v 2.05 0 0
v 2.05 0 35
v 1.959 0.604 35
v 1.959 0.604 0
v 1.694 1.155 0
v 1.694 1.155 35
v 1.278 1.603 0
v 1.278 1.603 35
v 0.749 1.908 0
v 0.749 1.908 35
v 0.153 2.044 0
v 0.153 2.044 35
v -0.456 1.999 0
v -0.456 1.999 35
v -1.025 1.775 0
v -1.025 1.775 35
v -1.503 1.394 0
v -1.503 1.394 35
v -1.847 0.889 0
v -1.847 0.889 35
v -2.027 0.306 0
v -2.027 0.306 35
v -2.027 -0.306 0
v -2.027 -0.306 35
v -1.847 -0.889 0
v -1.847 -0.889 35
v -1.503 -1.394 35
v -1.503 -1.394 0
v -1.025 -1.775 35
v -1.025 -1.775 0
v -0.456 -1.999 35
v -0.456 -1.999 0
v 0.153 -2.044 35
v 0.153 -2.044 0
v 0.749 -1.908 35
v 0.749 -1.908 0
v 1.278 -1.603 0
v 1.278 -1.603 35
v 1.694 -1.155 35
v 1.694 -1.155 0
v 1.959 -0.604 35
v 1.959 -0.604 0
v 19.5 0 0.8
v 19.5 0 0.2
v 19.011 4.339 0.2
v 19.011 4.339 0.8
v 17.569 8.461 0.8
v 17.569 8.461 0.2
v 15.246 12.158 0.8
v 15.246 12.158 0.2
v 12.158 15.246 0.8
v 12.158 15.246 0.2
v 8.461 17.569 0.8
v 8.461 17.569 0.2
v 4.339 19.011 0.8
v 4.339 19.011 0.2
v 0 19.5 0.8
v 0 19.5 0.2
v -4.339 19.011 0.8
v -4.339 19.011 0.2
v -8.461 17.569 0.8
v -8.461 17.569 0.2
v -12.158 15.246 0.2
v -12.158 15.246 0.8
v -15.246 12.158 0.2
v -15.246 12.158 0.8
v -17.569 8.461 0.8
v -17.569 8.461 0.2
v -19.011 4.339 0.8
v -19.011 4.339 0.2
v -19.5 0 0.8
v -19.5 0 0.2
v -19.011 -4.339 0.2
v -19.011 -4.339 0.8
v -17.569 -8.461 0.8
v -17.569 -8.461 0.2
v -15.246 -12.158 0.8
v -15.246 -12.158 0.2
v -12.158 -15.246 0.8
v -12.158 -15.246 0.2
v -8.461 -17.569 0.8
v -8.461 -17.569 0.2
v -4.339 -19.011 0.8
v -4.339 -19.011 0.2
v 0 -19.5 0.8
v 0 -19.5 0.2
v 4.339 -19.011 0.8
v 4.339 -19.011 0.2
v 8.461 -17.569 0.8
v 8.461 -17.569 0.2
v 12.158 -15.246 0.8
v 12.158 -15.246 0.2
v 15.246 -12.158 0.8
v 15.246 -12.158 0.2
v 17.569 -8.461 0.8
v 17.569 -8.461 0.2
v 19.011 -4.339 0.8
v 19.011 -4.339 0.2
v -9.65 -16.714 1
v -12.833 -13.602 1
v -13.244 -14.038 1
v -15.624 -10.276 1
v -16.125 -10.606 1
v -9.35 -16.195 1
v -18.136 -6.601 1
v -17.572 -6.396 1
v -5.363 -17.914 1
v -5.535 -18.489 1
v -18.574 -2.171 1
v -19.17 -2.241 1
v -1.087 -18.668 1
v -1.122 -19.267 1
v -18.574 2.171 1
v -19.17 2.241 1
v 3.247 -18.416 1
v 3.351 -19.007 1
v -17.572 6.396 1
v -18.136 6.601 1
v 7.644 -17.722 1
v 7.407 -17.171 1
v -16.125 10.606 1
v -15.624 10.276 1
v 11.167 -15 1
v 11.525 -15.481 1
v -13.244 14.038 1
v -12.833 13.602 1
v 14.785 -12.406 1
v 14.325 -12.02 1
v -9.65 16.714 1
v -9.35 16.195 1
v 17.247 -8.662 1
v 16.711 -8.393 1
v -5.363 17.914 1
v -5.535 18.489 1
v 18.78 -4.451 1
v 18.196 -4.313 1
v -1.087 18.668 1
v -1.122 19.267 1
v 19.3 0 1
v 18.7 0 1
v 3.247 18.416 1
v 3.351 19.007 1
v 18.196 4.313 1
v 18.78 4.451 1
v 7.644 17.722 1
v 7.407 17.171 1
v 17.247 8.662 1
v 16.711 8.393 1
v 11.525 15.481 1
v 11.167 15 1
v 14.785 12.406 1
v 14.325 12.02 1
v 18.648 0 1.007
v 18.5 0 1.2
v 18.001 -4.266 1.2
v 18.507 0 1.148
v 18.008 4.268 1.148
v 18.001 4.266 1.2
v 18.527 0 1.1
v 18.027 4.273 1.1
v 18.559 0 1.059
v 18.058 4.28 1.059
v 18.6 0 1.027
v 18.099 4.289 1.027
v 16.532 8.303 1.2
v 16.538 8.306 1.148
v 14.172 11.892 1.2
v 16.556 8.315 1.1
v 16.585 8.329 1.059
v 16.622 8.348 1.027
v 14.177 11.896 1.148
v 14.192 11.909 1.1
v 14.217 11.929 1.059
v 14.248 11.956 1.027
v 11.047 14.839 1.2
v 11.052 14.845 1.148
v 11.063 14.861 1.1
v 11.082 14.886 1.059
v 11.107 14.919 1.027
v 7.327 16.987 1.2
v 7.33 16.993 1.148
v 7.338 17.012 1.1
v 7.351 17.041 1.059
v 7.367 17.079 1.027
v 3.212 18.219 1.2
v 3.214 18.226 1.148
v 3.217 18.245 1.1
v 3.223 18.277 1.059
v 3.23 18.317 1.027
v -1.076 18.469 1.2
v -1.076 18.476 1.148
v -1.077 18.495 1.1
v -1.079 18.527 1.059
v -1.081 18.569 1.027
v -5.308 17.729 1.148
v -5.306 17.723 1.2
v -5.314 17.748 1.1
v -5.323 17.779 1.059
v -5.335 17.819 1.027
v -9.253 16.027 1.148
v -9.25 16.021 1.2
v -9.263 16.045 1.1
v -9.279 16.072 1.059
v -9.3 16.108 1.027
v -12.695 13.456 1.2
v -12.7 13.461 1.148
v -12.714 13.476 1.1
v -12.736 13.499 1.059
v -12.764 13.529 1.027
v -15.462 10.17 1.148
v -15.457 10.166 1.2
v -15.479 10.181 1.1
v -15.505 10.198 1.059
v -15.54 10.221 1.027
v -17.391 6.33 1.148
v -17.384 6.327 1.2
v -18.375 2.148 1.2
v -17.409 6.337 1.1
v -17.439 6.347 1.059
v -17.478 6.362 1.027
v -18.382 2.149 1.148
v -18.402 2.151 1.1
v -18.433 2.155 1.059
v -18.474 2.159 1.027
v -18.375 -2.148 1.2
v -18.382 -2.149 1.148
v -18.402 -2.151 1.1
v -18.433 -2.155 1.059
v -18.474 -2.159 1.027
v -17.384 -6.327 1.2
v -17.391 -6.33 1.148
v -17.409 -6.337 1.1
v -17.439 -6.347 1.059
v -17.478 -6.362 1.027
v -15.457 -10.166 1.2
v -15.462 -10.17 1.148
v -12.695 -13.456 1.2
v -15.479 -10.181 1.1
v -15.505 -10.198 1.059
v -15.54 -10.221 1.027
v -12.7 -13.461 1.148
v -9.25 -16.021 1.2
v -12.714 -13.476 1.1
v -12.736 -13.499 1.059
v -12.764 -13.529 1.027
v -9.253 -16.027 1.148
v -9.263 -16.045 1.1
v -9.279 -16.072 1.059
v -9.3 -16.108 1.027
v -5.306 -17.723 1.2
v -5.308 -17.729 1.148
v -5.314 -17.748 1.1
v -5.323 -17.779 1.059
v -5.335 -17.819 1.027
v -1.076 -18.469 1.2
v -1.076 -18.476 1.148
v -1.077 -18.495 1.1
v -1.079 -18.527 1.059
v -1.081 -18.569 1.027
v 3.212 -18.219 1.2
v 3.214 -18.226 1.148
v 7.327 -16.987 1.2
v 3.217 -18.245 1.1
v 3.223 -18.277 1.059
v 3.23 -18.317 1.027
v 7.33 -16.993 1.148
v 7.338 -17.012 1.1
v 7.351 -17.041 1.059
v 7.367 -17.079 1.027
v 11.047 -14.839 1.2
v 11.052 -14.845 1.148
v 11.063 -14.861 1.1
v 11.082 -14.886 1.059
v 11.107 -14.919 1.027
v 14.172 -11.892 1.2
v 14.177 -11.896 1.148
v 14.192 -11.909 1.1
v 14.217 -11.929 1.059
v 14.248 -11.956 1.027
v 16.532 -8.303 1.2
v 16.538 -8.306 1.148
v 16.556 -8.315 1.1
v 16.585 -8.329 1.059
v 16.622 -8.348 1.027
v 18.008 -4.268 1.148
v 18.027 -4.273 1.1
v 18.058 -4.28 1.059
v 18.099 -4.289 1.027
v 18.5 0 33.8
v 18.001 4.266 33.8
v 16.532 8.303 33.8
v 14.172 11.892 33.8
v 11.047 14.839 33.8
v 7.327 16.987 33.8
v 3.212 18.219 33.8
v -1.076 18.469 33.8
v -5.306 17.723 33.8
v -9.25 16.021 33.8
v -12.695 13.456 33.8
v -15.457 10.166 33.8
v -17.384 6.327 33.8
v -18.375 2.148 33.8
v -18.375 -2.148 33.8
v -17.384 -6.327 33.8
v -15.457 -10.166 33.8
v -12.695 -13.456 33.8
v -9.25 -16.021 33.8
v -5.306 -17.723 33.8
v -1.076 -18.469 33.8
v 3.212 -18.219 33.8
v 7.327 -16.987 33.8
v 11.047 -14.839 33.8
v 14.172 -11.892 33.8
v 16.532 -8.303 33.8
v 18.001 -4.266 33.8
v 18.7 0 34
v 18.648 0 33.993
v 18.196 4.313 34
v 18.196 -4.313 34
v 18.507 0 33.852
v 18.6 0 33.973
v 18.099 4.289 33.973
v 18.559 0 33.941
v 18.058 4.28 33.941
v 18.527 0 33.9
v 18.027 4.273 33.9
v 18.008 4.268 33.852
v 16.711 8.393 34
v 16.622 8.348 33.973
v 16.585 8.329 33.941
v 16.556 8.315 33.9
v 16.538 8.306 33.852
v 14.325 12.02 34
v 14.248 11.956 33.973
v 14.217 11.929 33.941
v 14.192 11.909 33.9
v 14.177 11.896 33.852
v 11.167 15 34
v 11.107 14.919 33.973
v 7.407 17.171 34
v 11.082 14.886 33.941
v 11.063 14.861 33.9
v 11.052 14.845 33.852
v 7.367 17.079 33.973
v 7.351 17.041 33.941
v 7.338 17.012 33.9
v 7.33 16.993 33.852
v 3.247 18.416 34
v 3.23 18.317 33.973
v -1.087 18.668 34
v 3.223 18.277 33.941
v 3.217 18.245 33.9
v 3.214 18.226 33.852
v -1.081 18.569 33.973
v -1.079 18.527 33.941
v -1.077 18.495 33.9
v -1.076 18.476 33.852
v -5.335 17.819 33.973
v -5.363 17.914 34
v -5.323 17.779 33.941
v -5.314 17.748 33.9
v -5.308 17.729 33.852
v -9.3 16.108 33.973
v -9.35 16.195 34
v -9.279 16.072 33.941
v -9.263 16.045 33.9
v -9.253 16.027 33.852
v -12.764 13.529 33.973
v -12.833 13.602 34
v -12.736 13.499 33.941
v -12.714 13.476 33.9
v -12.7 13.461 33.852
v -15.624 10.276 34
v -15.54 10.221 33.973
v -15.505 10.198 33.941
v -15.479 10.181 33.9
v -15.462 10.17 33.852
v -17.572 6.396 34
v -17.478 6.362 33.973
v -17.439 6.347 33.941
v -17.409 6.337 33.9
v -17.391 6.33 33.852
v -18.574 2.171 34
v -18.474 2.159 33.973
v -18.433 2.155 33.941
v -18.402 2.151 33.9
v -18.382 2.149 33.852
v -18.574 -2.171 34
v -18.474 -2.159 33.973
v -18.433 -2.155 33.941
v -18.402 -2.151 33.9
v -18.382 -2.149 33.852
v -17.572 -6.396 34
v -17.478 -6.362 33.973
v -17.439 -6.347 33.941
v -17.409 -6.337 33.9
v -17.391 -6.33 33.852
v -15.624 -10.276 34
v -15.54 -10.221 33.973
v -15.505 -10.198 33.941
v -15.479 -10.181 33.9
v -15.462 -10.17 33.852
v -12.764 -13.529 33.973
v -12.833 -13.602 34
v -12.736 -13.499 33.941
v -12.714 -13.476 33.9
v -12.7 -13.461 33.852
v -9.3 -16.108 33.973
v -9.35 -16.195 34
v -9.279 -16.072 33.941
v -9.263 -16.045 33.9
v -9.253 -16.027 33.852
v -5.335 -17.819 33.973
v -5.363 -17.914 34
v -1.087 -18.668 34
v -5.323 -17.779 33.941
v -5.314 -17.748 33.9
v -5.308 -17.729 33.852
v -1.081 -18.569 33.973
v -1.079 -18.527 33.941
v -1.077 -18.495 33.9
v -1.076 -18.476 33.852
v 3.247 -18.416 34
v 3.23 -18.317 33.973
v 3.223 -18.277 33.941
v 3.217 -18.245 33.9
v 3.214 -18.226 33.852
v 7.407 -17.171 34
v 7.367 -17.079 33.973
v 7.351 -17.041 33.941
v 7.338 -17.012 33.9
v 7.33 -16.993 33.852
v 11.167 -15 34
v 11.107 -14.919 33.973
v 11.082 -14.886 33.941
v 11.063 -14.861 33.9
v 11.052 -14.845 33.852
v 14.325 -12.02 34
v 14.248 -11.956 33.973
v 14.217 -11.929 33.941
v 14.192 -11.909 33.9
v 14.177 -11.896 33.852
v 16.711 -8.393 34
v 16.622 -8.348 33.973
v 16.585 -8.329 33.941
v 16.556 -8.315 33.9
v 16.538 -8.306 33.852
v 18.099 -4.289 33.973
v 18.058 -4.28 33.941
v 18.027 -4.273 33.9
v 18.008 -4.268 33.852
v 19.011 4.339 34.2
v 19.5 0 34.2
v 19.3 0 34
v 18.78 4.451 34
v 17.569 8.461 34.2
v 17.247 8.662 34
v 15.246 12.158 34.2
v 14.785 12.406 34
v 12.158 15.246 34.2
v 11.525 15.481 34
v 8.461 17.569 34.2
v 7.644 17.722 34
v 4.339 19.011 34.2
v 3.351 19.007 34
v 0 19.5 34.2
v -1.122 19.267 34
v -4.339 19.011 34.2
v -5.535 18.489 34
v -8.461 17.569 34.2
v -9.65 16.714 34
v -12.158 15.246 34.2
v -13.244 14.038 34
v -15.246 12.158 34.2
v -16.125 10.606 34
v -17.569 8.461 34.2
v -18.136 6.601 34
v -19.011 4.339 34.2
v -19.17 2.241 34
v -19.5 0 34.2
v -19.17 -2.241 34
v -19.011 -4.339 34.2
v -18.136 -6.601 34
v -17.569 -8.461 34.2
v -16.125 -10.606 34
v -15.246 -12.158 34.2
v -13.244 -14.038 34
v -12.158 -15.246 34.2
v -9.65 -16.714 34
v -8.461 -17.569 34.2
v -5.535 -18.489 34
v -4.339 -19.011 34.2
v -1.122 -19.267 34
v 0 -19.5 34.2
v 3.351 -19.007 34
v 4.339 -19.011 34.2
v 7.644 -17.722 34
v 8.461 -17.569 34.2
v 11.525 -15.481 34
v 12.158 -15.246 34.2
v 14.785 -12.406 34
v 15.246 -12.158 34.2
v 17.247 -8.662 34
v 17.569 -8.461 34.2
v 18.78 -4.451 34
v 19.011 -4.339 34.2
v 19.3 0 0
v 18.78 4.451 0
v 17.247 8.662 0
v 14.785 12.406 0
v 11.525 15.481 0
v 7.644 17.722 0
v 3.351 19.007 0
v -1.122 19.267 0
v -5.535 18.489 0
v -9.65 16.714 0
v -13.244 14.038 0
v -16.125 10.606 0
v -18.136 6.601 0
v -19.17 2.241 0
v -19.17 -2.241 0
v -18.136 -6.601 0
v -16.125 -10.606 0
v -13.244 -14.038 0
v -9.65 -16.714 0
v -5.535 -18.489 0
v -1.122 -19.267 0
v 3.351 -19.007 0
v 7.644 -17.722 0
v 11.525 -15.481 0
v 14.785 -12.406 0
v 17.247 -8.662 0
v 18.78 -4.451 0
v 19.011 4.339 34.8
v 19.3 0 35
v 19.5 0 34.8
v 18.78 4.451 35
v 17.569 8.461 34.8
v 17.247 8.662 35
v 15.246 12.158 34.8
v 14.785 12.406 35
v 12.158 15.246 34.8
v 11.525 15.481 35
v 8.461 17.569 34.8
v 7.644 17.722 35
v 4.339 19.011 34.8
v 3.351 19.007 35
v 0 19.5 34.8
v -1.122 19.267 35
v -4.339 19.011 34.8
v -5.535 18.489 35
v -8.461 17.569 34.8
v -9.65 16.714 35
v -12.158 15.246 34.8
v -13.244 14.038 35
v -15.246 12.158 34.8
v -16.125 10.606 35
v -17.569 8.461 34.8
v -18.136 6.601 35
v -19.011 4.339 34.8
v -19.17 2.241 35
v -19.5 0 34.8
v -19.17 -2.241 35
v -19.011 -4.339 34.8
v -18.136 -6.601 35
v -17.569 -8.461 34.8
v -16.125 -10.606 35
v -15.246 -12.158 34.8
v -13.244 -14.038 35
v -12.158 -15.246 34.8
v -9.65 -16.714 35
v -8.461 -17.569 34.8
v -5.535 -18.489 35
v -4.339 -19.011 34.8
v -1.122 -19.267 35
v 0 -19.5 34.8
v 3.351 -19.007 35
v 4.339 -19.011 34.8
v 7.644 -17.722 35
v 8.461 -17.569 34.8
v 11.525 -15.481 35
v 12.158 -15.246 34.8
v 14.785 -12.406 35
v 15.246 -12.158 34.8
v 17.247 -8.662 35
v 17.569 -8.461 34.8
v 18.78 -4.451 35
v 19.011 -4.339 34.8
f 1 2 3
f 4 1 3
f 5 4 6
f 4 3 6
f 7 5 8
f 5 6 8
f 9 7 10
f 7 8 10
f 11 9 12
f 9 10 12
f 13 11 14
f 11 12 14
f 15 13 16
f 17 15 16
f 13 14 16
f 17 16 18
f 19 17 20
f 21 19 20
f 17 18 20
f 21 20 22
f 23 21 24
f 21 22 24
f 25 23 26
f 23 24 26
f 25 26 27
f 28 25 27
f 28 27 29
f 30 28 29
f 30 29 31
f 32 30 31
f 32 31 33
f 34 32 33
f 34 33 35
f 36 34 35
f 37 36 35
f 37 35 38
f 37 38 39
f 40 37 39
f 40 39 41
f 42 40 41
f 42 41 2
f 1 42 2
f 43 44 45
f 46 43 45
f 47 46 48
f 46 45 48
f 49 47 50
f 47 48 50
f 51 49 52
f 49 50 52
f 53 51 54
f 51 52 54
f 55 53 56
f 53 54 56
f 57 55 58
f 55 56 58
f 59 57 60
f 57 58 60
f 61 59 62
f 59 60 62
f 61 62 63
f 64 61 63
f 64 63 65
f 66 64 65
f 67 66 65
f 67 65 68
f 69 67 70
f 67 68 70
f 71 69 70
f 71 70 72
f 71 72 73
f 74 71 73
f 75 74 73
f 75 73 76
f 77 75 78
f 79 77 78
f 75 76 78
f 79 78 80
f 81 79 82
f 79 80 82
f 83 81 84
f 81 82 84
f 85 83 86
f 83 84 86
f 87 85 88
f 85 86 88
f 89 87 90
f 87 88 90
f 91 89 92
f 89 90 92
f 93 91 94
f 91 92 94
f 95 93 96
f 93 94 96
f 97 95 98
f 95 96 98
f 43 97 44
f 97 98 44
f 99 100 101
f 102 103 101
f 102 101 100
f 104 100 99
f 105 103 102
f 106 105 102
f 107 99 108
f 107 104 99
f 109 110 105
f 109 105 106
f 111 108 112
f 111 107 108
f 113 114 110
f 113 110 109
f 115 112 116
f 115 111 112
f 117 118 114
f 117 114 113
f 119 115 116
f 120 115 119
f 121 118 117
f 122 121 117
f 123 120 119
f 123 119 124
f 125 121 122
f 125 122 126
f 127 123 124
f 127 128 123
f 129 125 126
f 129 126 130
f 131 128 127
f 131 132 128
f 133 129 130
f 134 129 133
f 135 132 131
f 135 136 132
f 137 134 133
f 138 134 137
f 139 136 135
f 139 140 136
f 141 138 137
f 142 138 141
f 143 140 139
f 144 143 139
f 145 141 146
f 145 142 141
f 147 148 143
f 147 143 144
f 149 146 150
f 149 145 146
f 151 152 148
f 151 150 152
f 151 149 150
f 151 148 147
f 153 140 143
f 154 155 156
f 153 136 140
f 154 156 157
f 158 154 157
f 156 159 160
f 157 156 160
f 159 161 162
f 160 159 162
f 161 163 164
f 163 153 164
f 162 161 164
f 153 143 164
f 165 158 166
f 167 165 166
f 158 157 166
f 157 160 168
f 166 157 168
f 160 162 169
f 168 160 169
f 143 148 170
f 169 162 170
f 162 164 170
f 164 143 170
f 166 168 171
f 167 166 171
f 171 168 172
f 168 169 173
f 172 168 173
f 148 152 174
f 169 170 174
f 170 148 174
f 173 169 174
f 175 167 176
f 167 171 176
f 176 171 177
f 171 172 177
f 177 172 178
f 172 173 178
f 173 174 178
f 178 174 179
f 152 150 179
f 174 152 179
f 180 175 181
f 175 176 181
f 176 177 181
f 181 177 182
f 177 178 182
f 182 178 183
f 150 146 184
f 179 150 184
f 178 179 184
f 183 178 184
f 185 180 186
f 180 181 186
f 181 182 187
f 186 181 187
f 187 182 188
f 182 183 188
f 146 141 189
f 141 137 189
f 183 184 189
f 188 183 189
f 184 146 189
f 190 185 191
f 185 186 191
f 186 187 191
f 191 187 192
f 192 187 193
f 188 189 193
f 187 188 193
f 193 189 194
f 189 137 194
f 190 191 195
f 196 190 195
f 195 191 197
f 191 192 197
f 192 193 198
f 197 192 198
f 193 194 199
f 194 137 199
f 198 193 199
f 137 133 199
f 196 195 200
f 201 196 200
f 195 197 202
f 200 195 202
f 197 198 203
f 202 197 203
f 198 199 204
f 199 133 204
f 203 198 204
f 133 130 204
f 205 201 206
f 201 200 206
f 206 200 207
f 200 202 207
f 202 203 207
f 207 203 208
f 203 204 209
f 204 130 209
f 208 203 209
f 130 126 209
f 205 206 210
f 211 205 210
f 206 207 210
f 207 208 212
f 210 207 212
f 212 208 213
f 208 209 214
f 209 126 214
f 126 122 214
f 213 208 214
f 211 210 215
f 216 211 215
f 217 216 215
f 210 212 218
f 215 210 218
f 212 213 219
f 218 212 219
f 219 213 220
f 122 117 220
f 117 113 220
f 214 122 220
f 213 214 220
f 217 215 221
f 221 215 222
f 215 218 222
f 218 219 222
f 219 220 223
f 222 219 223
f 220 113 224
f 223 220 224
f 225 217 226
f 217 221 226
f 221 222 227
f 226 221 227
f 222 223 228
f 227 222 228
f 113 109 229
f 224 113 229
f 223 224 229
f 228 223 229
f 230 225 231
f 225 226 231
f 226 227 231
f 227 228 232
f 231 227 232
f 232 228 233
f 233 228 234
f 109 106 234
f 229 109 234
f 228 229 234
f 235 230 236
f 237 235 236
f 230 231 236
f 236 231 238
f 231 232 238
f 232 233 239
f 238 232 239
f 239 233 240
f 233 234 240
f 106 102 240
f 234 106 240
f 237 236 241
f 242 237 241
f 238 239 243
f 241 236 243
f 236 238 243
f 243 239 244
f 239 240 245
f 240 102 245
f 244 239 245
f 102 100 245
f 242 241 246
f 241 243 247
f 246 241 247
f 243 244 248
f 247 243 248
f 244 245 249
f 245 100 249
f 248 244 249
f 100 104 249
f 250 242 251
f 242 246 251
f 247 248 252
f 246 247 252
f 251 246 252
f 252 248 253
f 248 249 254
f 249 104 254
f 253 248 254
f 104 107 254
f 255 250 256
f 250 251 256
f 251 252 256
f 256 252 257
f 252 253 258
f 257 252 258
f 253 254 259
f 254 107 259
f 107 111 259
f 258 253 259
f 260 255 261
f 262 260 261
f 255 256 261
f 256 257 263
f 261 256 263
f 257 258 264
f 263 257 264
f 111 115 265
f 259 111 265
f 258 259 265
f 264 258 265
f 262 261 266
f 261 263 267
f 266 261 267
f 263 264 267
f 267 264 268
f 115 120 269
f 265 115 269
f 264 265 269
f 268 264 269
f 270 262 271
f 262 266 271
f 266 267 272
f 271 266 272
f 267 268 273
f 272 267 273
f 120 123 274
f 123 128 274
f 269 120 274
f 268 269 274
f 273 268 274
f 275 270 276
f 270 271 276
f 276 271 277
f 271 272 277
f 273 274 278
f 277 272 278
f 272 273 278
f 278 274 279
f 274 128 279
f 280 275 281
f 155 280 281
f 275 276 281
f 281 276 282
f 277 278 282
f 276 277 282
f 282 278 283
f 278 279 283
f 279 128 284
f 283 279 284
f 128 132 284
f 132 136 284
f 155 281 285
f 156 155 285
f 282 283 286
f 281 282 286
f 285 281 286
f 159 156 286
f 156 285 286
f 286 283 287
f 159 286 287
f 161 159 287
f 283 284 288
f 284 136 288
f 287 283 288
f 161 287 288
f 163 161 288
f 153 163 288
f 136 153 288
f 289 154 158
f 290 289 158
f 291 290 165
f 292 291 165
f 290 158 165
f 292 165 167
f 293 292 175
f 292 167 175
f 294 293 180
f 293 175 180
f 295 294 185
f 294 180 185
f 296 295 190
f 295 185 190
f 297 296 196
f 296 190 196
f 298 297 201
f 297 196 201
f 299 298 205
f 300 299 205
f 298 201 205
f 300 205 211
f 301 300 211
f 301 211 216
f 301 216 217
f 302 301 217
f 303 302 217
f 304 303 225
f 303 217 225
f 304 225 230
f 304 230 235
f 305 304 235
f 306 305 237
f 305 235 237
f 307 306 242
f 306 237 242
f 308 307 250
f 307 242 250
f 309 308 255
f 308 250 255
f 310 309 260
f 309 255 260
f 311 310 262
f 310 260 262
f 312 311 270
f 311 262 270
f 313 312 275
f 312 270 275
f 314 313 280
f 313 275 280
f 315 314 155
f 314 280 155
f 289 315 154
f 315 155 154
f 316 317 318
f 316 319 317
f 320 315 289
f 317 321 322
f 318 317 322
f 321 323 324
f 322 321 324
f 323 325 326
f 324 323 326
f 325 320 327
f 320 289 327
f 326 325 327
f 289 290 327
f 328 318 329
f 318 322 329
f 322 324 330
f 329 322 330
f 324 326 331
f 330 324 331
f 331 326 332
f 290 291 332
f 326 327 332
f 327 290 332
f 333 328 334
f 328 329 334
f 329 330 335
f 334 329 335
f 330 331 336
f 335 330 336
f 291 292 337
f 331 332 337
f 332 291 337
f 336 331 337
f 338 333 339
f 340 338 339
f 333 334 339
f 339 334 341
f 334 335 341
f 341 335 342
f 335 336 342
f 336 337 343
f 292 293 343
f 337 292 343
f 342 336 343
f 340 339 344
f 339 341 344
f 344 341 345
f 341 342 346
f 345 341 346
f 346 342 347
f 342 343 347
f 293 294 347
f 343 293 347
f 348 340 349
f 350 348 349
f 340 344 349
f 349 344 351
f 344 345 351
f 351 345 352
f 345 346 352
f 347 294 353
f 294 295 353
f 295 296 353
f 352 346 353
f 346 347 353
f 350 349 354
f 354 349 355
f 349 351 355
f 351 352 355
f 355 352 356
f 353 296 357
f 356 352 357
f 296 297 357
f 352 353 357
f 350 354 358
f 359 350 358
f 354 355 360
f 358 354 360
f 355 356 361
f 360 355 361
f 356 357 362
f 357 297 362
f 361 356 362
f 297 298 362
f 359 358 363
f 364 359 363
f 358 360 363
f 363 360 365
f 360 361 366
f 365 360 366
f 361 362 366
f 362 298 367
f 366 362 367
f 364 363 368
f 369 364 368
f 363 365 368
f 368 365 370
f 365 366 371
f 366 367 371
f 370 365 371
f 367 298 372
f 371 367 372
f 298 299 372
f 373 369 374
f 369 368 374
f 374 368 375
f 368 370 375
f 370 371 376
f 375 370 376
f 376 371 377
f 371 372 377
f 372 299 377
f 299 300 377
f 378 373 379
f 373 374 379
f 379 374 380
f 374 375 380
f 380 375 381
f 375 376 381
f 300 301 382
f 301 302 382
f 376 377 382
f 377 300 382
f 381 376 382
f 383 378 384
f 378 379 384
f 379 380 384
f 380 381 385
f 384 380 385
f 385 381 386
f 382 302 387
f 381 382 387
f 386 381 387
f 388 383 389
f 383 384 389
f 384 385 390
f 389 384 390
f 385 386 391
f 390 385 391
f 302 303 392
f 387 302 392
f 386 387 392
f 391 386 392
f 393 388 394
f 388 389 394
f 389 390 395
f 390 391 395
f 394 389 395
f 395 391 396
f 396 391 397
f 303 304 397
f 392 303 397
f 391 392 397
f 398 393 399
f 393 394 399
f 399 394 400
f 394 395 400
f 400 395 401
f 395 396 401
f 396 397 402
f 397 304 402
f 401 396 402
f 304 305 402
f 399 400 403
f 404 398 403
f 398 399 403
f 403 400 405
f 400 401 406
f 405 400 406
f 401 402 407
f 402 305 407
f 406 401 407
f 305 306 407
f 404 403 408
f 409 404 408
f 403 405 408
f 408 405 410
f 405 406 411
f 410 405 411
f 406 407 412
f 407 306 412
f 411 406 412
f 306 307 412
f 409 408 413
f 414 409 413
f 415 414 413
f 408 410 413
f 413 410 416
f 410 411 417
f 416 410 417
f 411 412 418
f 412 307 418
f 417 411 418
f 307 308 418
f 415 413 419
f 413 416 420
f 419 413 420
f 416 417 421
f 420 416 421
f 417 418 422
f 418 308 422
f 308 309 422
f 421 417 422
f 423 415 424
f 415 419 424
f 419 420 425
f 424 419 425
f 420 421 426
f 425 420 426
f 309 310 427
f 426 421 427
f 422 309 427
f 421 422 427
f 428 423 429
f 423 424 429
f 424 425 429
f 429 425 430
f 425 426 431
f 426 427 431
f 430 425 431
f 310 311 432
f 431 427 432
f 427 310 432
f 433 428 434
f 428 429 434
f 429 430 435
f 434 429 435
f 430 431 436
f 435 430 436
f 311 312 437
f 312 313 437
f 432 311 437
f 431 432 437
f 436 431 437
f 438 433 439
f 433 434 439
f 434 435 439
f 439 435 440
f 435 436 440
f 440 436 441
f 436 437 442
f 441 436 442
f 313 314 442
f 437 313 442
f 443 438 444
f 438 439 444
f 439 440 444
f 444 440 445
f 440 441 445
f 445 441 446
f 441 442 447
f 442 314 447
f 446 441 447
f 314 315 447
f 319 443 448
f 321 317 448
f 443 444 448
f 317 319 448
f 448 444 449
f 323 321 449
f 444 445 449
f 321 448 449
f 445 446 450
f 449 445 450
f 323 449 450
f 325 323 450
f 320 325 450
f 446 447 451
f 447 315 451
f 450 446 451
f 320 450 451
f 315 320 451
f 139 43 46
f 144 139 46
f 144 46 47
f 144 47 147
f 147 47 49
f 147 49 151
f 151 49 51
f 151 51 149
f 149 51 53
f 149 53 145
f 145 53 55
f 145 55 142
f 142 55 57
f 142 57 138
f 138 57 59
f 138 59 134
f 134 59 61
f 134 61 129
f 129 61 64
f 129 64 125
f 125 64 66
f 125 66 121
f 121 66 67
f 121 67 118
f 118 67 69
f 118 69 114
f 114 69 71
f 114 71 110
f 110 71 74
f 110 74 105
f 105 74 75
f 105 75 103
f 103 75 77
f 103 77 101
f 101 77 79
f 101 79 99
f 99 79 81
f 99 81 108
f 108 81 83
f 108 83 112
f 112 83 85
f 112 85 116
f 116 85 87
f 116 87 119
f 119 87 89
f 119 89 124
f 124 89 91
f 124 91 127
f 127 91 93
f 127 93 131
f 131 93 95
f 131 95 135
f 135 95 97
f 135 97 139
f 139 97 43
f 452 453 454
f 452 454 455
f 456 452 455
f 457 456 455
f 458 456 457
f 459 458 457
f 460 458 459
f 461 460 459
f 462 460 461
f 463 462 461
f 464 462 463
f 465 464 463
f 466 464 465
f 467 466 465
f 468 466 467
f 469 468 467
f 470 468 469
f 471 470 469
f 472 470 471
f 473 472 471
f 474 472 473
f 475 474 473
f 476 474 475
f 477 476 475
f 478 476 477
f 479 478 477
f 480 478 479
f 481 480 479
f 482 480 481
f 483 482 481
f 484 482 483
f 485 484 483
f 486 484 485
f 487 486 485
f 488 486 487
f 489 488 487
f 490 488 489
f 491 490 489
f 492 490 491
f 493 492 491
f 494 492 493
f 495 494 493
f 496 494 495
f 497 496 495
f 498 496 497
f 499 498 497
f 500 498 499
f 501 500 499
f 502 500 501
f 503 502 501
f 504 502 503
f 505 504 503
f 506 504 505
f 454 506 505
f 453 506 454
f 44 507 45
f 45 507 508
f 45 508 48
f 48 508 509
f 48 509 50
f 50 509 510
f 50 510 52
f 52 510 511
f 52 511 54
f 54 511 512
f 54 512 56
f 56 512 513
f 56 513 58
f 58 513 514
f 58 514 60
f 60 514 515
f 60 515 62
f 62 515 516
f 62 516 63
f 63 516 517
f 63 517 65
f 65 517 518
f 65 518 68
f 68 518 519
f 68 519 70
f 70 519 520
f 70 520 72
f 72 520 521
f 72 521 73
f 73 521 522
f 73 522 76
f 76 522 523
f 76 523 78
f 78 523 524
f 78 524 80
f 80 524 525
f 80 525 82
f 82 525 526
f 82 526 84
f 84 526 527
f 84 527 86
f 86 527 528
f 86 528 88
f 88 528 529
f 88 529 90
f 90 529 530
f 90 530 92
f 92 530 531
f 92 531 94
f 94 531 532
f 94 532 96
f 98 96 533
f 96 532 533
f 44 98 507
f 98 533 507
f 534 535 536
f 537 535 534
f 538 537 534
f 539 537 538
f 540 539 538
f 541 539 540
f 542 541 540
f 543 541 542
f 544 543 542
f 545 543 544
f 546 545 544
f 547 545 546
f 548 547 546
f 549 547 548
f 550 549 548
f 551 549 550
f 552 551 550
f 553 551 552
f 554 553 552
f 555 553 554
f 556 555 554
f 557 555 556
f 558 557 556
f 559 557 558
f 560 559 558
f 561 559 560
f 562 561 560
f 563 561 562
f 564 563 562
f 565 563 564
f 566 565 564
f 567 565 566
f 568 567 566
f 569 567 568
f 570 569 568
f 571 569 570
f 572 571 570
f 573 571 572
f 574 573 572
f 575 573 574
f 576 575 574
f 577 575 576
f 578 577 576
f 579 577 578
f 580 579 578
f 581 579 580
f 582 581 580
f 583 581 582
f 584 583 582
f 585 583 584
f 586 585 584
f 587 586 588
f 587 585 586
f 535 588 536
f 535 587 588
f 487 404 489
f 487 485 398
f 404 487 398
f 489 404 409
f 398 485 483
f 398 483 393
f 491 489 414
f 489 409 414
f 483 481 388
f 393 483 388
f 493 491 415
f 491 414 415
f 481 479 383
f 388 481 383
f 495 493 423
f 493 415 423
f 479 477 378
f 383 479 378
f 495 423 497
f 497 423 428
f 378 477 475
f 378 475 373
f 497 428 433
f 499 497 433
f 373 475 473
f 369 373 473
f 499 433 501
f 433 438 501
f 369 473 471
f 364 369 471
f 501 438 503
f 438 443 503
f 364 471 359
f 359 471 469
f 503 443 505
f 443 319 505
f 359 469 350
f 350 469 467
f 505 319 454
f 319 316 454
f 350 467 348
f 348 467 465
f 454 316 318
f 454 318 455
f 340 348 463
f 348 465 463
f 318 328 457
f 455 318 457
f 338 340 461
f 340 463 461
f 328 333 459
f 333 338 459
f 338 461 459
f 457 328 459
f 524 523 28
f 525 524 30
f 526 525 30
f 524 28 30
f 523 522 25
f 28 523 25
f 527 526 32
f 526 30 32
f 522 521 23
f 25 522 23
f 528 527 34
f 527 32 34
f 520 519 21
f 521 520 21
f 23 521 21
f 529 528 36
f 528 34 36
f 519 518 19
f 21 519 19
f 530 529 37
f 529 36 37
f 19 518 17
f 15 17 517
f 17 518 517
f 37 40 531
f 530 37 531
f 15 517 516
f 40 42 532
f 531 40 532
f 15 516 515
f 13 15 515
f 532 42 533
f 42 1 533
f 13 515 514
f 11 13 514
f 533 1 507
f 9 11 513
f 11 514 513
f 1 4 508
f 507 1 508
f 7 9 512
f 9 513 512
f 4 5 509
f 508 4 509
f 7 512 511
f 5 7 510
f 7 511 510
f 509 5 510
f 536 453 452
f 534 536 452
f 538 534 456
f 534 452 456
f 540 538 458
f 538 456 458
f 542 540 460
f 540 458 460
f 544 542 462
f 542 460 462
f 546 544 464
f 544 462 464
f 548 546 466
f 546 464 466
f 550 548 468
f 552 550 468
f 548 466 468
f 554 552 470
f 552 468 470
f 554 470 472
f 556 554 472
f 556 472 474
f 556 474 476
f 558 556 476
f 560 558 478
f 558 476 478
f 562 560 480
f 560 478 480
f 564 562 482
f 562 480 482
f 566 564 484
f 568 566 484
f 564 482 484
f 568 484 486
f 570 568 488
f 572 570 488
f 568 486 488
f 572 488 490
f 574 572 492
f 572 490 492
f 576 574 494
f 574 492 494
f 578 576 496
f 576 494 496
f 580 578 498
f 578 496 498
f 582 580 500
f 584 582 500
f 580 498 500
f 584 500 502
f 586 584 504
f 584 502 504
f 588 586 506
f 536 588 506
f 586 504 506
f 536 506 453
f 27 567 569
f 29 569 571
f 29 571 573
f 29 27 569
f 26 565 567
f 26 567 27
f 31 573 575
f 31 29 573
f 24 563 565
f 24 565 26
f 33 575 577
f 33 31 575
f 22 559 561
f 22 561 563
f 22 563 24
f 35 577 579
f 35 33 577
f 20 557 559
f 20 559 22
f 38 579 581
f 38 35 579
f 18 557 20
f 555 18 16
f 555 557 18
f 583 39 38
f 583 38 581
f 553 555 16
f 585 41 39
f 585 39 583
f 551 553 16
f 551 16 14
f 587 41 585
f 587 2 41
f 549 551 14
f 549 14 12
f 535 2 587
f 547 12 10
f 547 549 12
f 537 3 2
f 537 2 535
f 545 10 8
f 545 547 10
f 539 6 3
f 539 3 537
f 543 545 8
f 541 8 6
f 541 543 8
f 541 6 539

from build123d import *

# Parameters (mm, degrees)
SKETCH1_R           = 19.5
BOSS_EXTRUDE1_DEPTH = 1
SKETCH2_R           = 18.5
BOSS_EXTRUDE2_DEPTH = 33
SKETCH3_R           = 19.5
BOSS_EXTRUDE3_DEPTH = 1
FILLET1_R           = 0.2
CHAMFER1_SIZE       = 0.2
SKETCH4_R           = 2.05
CUT_EXTRUDE1_DEPTH  = 45.558949718


with BuildPart() as part:
    # Sketch1 → Boss-Extrude1 (new body)
    with BuildSketch(Plane.XY):
        Circle(SKETCH1_R)
    extrude(amount=BOSS_EXTRUDE1_DEPTH)

    # Sketch2 → Boss-Extrude2 (add)
    with BuildSketch(Plane.XY.offset(1)):
        Circle(SKETCH2_R)
    extrude(amount=BOSS_EXTRUDE2_DEPTH)

    # Sketch3 → Boss-Extrude3 (add)
    with BuildSketch(Plane.XY.offset(34)):
        Circle(SKETCH3_R)
    extrude(amount=BOSS_EXTRUDE3_DEPTH)

    # Fillet1
    fillet1_edges = [part.edges().sort_by_distance(p)[0] for p in [
        (-18.5, 0, 1),
        (-18.5, 0, 34),
    ]]
    fillet(fillet1_edges, radius=FILLET1_R)

    # Chamfer1
    chamfer1_edges = [part.edges().sort_by_distance(p)[0] for p in [
        (-19.5, 0, 35),
        (-19.5, 0, 0),
        (-19.5, 0, 1),
        (-19.5, 0, 34),
    ]]
    chamfer(chamfer1_edges, length=CHAMFER1_SIZE)

    # Sketch4 → Cut-Extrude1 (cut, through all)
    with BuildSketch(Plane.XY.offset(35)):
        Circle(SKETCH4_R)
    extrude(amount=-CUT_EXTRUDE1_DEPTH, mode=Mode.SUBTRACT)


solid = part.part
